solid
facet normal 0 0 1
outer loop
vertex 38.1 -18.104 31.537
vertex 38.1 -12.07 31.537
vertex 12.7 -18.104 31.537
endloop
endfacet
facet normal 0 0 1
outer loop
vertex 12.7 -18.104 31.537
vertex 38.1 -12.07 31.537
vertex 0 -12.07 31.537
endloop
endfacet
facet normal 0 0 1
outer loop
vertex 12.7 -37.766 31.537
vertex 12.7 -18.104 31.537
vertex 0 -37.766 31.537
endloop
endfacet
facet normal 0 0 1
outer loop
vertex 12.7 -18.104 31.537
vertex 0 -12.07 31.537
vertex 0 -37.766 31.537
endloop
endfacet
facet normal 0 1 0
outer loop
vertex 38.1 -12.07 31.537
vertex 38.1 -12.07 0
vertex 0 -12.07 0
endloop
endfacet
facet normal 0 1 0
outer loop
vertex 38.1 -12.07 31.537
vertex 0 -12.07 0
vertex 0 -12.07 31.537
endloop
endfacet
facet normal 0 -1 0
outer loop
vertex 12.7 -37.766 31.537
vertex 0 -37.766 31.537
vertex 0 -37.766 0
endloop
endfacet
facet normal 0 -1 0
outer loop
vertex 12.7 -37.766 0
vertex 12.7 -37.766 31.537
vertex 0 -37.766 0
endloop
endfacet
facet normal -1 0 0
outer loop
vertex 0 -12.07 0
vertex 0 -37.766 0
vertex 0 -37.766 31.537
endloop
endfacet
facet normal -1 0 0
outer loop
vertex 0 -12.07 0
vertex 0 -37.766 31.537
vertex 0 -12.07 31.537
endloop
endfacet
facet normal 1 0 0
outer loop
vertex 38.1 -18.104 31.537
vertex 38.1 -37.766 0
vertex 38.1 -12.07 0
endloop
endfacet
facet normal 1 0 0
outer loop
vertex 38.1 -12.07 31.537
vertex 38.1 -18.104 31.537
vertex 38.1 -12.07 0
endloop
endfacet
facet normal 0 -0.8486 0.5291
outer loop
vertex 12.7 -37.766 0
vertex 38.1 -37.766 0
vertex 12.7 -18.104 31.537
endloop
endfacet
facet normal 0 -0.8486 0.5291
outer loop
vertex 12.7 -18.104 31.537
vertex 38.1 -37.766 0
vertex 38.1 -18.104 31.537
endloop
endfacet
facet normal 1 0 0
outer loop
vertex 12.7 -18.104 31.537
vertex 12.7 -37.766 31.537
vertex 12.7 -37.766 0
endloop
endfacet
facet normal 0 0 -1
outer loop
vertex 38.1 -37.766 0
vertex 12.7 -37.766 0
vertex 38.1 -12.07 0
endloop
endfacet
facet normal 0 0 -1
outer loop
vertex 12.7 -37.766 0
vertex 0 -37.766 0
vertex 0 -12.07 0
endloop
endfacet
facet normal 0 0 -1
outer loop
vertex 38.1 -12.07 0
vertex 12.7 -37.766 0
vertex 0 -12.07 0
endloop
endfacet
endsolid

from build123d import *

# Parameters (mm, degrees)
F0_W     = 25.6966426969
F0_H     = 31.5367914736
F1_DEPTH = 38.1
F3_DEPTH = 25.4
F4_DEPTH = 50.8


with BuildPart() as f1:
    # F0 (on Right) → F1 (new body)
    with BuildSketch(Plane.YZ):
        with Locations((-24.9179564416, 15.7683957368)):
            Rectangle(F0_W, F0_H)
    extrude(amount=F1_DEPTH)

    # F2 (on face) → F3 (join)
    with BuildSketch(Plane.YZ.offset(38.1)):
        Polygon((-37.7662777901, 0), (-18.1044526398, 31.5367914736), (-37.7662777901, 31.5367914736), align=None)
    extrude(amount=F3_DEPTH)

    # F4 (cut): a face of the model
    f4_faces = [f1.faces().sort_by_distance(p)[0] for p in [
        (63.5, -31.2123360733, 21.0245276491),
    ]]
    extrude(f4_faces, amount=-F4_DEPTH, mode=Mode.SUBTRACT)


solid = f1.part
